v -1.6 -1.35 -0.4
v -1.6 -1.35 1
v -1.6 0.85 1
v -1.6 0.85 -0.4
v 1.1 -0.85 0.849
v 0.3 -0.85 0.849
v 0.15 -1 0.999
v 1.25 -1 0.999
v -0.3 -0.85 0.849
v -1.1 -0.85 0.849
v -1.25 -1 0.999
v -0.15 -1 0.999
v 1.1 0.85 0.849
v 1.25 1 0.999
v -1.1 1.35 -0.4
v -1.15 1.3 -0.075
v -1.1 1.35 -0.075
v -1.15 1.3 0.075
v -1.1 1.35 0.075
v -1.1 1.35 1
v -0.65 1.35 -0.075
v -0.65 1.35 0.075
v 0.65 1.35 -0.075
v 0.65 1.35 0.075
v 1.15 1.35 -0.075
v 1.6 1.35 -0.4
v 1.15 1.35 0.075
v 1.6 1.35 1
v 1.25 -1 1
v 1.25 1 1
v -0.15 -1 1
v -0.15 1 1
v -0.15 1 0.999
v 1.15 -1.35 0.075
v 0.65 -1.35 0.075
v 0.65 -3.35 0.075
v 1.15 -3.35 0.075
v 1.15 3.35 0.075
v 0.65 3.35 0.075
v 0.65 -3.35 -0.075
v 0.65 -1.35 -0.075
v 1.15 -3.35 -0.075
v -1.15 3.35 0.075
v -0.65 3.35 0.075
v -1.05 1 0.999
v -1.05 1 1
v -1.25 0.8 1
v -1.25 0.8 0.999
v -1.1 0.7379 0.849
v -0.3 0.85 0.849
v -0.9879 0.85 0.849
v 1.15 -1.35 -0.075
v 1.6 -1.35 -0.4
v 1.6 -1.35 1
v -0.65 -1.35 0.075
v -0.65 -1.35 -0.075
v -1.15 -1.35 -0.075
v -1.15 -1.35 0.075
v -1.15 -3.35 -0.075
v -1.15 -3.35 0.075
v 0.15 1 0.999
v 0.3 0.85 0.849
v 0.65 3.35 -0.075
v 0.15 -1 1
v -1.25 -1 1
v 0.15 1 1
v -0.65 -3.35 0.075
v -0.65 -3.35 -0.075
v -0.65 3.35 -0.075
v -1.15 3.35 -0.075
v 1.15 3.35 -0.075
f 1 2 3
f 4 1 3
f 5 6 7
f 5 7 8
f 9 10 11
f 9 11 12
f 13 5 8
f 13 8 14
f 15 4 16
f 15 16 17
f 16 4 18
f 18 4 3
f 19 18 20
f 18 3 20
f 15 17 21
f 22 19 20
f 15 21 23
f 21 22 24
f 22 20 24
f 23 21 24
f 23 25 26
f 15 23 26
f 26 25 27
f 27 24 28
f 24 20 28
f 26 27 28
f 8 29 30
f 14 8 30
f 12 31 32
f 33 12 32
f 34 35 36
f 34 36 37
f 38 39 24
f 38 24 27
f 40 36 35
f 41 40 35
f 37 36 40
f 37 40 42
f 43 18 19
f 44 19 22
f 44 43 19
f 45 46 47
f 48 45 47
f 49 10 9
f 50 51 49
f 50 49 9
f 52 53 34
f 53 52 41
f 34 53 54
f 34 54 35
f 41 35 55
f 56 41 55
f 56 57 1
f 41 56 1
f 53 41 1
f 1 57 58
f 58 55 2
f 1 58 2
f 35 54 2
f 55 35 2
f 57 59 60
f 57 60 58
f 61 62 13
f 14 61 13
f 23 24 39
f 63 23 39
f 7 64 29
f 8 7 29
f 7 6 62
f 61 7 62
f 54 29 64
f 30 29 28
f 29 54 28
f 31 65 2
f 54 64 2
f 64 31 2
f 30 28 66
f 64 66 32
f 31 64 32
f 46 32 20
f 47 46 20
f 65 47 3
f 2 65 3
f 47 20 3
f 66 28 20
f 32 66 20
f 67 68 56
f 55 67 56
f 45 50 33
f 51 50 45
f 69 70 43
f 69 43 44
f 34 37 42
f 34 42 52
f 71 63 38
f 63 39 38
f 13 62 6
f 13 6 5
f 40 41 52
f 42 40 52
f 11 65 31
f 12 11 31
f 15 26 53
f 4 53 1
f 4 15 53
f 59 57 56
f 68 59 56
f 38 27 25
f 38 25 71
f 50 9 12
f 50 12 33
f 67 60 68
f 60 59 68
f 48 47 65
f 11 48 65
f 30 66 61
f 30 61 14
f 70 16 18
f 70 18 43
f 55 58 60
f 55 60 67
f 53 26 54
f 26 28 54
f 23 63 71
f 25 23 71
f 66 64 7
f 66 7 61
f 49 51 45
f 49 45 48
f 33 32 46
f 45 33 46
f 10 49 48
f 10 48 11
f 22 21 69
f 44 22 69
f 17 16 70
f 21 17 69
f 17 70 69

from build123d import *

# Parameters (mm, degrees)
SKETCH002_W    = 0.5
SKETCH002_H    = 6.7
PAD001_DEPTH   = 0.075
PAD_DEPTH      = 1
PAD_DEPTH_BACK = 0.4
SKETCH001_W    = 1.1
SKETCH001_H    = 2
POCKET_DEPTH   = 0.151
CHAMFER_SIZE   = 0.15


with BuildPart() as pad001:
    # Sketch002 → Pad001 (new body, symmetric)
    with BuildSketch(Plane.XY):
        with Locations((-0.9, 0)):
            Rectangle(SKETCH002_W, SKETCH002_H)
        with Locations((0.9, 0)):
            Rectangle(SKETCH002_W, SKETCH002_H)
    extrude(amount=PAD001_DEPTH, both=True)


with BuildPart() as everlight_itr8307:
    # Sketch → Pad (new body, two sides)
    with BuildSketch(Plane.XY) as pad_sk:
        Polygon((-1.1, 1.35), (1.6, 1.35), (1.6, -1.35), (-1.6, -1.35), (-1.6, 0.85), align=None)
    extrude(amount=PAD_DEPTH)
    extrude(pad_sk.sketch, amount=-PAD_DEPTH_BACK)

    # Sketch001 → Pocket (cut)
    with BuildSketch(Plane.XY.offset(1)):
        Polygon((-1.25, -1), (-0.15, -1), (-0.15, 1), (-1.05, 1), (-1.25, 0.8), align=None)
        with Locations((0.7, 0)):
            Rectangle(SKETCH001_W, SKETCH001_H)
    extrude(amount=-POCKET_DEPTH, mode=Mode.SUBTRACT)

    # Chamfer
    chamfer_edges = [everlight_itr8307.edges().sort_by_distance(p)[0] for p in [
        (-1.15, 0.9, 0.849),
        (-0.6, 1, 0.849),
        (-1.25, -0.1, 0.849),
        (0.15, 0, 0.849),
        (0.7, 1, 0.849),
        (1.25, 0, 0.849),
        (-0.15, 0, 0.849),
        (0.7, -1, 0.849),
        (-0.7, -1, 0.849),
    ]]
    chamfer(chamfer_edges, length=CHAMFER_SIZE)

    # Chamfer_mp_cp: union Pad001
    add(pad001.part)


solid = everlight_itr8307.part
